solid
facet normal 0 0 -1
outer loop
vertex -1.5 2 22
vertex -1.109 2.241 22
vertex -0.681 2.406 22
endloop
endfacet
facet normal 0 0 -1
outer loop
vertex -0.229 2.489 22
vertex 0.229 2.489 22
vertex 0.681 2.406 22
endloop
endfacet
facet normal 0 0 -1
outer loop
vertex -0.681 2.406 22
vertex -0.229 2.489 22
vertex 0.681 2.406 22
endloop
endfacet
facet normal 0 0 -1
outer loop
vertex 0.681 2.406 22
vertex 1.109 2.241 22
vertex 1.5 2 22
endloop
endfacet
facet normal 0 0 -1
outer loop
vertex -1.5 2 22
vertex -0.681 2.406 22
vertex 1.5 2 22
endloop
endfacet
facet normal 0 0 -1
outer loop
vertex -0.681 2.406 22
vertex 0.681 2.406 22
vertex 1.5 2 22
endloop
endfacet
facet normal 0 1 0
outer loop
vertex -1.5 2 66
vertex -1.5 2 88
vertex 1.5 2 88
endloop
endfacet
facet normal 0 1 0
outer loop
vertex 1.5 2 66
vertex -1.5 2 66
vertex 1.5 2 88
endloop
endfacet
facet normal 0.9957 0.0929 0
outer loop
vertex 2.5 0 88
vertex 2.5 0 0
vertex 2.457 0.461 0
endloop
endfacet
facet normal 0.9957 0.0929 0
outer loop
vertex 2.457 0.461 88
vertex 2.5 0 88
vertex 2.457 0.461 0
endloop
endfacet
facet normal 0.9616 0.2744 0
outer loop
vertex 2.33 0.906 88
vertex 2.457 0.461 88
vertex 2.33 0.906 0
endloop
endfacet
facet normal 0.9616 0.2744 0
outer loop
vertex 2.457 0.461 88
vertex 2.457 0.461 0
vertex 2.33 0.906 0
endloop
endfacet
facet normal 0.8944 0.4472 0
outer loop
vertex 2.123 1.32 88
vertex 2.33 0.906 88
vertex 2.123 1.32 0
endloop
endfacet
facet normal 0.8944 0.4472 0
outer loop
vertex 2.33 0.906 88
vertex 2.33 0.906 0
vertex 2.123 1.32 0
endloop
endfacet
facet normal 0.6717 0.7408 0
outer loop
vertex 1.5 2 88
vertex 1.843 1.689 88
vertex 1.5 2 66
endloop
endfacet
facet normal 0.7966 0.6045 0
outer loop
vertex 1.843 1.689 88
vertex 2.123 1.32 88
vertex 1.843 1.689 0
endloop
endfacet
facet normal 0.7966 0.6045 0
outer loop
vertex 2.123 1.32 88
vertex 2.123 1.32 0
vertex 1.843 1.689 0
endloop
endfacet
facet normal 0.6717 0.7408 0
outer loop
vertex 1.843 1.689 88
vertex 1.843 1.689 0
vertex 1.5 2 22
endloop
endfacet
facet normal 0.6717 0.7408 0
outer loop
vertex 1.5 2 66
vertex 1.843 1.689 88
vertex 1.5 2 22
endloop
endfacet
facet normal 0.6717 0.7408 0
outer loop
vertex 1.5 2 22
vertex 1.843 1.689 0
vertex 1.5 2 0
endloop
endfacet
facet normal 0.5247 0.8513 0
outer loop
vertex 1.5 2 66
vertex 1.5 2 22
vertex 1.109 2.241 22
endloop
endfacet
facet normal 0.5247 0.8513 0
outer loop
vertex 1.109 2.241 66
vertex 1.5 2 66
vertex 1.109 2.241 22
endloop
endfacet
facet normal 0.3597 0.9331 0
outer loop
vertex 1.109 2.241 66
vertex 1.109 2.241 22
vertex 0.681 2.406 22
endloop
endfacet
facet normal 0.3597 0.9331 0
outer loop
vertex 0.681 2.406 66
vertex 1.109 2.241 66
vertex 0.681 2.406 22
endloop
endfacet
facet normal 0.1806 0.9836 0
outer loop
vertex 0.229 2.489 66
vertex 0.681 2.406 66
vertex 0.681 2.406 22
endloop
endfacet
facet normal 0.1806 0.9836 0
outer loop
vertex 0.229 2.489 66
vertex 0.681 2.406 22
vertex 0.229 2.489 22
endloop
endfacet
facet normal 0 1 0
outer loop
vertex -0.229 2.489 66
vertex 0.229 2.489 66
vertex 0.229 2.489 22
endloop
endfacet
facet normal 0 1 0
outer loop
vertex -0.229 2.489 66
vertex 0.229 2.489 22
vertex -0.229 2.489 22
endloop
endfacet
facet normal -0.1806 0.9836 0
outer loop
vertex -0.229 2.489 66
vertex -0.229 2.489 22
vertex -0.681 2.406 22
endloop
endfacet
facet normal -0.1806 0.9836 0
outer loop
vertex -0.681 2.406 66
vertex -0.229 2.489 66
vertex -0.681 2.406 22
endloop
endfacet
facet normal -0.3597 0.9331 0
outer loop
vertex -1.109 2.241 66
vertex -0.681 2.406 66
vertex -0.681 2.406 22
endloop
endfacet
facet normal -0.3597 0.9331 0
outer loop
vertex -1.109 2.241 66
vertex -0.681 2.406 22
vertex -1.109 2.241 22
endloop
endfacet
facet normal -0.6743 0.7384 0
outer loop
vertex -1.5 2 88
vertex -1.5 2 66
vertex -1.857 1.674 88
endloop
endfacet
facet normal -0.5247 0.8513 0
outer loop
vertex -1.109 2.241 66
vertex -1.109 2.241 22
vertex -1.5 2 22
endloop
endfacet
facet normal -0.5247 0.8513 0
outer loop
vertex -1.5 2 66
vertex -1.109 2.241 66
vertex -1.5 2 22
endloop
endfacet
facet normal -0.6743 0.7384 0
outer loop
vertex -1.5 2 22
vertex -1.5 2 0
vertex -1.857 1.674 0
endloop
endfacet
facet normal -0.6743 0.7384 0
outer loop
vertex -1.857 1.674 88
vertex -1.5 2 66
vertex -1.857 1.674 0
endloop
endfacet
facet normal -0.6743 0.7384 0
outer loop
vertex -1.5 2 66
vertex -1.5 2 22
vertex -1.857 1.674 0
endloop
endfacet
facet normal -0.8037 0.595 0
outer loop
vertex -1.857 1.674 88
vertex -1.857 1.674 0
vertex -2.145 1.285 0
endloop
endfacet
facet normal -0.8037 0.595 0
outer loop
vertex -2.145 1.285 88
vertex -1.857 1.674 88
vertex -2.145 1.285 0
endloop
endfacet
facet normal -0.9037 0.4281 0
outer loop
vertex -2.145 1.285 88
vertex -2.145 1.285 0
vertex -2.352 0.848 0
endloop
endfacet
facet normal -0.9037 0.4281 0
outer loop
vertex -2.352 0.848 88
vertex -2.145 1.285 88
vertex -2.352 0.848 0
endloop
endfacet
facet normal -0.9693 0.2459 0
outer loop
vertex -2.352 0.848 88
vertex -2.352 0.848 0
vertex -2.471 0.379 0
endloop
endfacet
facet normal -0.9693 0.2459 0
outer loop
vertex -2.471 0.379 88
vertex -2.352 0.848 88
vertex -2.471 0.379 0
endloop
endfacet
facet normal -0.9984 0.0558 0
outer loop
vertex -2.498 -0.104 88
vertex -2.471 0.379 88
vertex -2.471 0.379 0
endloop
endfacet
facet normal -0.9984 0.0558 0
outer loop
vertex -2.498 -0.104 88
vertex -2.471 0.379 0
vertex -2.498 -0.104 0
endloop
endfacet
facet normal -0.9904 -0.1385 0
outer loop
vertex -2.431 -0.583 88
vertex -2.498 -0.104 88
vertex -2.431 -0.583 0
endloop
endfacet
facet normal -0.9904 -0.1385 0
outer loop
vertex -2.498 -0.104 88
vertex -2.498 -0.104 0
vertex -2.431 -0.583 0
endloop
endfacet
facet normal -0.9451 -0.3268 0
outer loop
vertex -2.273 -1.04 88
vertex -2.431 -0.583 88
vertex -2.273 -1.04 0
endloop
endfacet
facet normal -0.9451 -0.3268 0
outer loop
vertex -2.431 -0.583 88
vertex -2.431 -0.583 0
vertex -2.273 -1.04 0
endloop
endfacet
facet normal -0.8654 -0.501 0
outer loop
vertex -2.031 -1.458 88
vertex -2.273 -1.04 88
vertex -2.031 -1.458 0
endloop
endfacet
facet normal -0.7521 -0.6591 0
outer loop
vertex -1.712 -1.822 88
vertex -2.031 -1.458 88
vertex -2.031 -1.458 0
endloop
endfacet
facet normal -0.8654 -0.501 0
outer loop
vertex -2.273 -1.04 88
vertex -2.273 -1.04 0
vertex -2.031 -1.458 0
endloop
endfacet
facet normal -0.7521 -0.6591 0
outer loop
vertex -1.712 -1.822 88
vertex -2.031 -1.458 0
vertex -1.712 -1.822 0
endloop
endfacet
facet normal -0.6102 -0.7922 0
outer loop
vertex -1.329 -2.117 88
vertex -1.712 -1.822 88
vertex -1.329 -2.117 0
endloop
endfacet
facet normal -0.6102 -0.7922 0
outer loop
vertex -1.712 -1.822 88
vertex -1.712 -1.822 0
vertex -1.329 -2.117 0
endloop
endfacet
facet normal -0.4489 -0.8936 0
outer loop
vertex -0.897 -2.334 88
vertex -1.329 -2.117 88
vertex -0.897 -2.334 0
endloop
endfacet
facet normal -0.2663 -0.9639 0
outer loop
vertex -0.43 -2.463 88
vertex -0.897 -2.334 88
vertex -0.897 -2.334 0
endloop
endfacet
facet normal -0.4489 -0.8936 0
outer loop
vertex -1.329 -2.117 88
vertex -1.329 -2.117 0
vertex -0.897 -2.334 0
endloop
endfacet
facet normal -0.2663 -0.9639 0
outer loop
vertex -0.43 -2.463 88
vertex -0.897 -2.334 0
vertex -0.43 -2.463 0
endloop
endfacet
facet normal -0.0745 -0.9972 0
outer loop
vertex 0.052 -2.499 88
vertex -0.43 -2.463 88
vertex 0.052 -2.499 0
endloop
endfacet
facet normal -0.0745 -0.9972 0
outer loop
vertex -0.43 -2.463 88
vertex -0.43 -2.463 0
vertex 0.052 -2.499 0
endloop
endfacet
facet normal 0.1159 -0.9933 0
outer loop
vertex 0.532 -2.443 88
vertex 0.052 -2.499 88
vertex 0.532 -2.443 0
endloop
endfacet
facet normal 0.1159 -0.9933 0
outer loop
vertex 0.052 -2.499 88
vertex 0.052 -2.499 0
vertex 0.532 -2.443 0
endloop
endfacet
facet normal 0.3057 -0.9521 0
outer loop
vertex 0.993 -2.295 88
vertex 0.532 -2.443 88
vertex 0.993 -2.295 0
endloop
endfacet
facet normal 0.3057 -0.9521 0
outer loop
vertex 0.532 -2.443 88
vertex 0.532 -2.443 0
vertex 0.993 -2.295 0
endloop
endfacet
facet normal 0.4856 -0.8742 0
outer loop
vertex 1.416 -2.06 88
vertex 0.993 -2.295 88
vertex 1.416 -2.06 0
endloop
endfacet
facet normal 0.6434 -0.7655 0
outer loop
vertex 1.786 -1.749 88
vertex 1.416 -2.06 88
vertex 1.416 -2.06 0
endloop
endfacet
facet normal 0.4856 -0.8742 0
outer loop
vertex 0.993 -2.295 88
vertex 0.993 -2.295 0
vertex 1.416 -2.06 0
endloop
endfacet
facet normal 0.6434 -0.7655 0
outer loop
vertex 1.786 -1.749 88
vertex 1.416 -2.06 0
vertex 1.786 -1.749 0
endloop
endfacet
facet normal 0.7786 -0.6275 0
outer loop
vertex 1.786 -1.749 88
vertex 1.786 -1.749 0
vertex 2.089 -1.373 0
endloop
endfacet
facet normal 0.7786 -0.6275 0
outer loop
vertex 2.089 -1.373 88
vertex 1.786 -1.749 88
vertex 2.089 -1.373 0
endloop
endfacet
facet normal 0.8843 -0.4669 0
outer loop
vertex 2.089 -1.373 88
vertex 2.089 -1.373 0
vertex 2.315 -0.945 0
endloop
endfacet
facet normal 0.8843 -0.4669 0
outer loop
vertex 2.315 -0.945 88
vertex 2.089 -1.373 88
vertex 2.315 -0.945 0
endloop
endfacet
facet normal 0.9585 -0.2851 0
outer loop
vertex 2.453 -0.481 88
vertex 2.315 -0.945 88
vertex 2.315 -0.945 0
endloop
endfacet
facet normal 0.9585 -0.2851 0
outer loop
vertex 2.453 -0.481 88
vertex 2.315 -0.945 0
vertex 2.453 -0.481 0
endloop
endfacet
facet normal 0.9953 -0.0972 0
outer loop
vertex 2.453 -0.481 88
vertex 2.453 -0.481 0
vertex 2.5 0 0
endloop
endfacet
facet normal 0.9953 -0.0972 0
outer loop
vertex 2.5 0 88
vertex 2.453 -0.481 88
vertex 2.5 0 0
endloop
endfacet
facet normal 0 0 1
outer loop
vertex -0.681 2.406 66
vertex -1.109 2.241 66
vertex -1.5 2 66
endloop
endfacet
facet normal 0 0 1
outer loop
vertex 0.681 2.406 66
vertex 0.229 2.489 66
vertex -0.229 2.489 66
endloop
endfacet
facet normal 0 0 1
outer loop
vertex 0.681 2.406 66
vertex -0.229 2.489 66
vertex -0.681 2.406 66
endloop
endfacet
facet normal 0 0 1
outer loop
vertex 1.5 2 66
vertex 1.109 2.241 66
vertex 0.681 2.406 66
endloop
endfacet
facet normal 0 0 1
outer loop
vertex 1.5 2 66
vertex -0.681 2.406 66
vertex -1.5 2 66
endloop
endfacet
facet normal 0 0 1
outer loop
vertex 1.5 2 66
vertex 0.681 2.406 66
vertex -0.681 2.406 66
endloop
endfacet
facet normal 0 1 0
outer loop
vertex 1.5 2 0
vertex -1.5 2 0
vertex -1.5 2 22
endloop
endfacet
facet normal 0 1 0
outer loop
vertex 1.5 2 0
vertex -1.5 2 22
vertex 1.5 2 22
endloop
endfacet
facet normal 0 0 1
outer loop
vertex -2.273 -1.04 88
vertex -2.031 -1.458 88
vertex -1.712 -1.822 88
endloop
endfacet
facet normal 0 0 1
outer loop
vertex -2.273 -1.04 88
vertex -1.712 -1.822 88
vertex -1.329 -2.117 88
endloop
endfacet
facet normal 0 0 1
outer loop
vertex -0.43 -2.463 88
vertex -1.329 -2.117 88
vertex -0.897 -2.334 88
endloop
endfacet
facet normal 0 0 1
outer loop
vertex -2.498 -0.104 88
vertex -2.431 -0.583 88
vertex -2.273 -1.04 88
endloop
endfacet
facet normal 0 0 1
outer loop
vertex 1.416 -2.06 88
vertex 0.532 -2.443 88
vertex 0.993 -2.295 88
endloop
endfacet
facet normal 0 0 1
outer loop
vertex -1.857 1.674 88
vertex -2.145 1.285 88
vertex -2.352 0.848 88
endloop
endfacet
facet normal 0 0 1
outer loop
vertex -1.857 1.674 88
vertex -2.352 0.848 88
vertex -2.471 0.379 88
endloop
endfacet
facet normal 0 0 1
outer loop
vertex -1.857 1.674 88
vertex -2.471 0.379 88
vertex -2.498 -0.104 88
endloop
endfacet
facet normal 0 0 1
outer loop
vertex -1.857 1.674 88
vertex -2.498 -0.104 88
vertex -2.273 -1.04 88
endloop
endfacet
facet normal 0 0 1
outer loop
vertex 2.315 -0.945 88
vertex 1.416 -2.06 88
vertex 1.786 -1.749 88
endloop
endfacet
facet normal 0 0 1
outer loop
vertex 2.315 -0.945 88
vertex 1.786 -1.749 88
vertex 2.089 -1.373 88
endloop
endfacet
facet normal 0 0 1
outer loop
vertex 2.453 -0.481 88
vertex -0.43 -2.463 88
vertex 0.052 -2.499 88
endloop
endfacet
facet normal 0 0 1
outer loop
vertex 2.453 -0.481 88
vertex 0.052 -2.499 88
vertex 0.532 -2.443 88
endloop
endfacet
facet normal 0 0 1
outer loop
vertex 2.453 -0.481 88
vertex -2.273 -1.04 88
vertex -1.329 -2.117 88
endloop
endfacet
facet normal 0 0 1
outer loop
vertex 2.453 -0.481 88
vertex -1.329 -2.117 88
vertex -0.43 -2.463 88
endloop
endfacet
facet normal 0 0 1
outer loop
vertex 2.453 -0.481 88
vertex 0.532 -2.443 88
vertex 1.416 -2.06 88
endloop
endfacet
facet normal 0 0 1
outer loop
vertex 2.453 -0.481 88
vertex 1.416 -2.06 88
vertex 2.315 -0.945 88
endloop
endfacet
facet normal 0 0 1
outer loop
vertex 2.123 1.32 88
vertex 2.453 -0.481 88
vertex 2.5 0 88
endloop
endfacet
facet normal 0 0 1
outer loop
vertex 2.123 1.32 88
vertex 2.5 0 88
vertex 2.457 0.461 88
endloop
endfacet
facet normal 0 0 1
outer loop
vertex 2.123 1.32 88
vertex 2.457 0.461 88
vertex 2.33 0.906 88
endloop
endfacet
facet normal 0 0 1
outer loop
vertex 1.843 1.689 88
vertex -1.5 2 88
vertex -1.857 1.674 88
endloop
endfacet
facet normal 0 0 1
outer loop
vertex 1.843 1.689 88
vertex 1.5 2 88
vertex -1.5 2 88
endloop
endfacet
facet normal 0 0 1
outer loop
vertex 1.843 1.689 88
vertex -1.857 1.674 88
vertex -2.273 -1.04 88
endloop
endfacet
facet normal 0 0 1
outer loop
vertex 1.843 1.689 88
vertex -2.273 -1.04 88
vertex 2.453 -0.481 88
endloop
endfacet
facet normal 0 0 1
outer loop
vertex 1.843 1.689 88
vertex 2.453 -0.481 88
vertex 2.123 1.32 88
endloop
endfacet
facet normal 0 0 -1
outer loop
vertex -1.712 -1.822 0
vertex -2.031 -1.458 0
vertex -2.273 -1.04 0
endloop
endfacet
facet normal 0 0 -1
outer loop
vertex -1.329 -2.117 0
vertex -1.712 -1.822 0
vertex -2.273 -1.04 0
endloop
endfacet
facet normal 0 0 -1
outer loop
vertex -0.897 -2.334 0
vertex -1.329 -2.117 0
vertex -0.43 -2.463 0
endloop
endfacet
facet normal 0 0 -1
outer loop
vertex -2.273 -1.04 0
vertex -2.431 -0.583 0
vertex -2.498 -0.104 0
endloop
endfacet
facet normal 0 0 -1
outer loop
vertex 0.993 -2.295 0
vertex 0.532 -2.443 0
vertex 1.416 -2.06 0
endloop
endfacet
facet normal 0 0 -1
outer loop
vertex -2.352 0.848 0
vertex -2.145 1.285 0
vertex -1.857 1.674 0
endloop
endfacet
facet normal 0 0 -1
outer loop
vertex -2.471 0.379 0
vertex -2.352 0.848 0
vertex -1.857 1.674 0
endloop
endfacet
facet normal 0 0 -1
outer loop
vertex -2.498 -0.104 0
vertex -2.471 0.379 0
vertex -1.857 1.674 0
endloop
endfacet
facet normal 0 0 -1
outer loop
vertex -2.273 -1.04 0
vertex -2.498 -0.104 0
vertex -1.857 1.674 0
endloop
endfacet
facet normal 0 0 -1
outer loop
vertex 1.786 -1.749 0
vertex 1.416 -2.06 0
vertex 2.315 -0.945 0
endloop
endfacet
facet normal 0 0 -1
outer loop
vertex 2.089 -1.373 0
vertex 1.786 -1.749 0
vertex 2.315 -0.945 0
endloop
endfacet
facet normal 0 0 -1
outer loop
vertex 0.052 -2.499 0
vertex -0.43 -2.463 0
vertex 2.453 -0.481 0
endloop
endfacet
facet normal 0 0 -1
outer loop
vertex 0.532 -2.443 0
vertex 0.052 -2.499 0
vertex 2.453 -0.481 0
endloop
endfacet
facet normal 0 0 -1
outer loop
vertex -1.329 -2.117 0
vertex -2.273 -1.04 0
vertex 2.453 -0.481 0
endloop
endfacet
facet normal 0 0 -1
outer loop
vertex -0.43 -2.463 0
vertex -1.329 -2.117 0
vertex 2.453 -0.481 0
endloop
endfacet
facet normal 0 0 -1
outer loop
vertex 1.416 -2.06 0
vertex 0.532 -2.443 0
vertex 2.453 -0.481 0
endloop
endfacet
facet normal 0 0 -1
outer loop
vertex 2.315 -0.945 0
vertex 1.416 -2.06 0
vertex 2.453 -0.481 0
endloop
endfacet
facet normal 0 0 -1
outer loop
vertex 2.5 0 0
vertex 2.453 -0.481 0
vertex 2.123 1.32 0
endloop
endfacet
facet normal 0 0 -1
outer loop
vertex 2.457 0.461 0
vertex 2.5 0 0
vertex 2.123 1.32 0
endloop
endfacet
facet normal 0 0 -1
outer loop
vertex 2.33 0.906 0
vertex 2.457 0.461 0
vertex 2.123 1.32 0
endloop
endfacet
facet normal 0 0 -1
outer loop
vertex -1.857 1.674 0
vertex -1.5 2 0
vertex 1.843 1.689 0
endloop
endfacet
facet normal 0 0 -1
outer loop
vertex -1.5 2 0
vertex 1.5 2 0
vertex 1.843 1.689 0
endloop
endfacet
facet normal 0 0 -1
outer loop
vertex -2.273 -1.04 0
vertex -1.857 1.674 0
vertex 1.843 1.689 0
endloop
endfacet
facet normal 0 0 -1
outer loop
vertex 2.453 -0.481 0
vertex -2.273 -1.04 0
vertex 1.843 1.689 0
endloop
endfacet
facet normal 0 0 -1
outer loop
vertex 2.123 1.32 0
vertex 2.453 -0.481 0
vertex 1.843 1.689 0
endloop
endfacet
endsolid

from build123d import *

# Parameters (mm, degrees)
SKETCH_1_R          = 2.5
EXTRUDE_1_DEPTH     = 88
CUT_EXTRUDE_1_DEPTH = 22


with BuildPart() as part:
    # 스케치1 → 보스-돌출1 (new body)
    with BuildSketch(Plane.XY):
        Circle(SKETCH_1_R)
    extrude(amount=EXTRUDE_1_DEPTH)

    # 스케치2 → 컷-돌출1 (cut)
    with BuildSketch(Plane(origin=(0, 0, 0), x_dir=(-1, 0, 0), z_dir=(0, 0, -1))):
        with BuildLine():
            Line((1.5, 2), (-1.5, 2))
            ThreePointArc((-1.5, 2), (0, 2.5), (1.5, 2))
        make_face()
    cut_extrude_1 = extrude(amount=-CUT_EXTRUDE_1_DEPTH, mode=Mode.SUBTRACT)

    # 대칭 복사1: 컷-돌출1 across plane
    add(cut_extrude_1.mirror(Plane(origin=(0, 0, 44), x_dir=(1, 0, 0), z_dir=(0, 0, -1))), mode=Mode.SUBTRACT)


solid = part.part
